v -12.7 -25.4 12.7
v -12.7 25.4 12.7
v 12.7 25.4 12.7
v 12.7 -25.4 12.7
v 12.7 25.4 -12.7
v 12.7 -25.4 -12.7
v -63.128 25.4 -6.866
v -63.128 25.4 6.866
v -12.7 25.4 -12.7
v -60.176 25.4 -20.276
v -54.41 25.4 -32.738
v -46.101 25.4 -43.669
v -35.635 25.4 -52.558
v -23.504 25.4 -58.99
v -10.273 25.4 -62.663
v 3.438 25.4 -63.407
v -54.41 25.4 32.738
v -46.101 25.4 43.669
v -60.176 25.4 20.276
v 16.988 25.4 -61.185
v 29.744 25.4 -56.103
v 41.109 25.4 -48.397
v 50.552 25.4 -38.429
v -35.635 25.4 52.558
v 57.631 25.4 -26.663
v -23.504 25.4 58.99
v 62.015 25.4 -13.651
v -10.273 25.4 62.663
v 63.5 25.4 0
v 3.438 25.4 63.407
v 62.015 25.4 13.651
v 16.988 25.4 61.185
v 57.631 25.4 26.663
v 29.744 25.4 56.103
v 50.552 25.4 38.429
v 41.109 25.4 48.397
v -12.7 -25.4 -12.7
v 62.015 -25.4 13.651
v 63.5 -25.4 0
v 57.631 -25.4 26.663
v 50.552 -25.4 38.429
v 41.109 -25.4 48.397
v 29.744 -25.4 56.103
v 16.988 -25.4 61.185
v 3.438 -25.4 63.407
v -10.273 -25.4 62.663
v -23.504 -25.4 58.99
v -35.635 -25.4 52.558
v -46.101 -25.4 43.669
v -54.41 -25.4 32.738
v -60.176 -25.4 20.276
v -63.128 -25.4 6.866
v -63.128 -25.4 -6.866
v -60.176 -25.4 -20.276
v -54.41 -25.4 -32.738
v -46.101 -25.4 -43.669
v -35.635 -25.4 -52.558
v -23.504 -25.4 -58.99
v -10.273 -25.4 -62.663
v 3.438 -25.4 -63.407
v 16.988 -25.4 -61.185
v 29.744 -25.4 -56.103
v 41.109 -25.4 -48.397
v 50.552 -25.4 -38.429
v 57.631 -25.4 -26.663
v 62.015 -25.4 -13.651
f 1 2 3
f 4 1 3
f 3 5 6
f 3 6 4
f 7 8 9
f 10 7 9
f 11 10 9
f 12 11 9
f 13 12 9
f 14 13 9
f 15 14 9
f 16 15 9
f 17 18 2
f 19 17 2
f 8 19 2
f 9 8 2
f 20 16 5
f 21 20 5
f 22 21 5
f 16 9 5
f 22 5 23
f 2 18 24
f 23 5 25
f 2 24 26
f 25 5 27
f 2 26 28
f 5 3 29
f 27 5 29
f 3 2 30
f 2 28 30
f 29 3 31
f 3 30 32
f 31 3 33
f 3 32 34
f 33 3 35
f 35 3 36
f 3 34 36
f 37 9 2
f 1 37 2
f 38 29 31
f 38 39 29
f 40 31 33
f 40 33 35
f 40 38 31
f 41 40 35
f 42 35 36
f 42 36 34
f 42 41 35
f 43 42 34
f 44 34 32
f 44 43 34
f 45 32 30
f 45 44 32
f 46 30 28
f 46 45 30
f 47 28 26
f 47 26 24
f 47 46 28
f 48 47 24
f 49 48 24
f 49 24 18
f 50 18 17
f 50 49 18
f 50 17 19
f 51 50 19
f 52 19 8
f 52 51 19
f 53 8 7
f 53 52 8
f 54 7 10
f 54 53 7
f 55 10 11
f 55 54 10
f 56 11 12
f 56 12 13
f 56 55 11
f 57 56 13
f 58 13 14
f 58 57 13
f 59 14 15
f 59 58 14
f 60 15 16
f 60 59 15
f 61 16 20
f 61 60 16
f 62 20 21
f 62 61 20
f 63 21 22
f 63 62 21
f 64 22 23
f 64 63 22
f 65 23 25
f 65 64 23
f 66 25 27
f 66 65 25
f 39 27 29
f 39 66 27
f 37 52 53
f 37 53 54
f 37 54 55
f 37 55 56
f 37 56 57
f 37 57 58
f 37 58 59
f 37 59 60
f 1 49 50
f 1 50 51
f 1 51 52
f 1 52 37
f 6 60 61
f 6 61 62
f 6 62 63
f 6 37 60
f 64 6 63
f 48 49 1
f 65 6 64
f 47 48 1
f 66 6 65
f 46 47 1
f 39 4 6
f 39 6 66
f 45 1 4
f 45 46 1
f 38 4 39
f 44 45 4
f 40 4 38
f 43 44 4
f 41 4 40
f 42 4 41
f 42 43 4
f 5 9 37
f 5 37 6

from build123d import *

# Parameters (mm, degrees)
F0_R     = 63.5
F1_DEPTH = 25.4
F2_W     = 25.4
F2_H     = 25.4
F3_DEPTH = 50.801


with BuildPart() as f1:
    # F0 (on Front) → F1 (new body, symmetric)
    with BuildSketch(Plane.XZ):
        Circle(F0_R)
    extrude(amount=F1_DEPTH, both=True)

    # F2 (on face) → F3 (cut, through all)
    with BuildSketch(Plane.XZ.offset(25.4)):
        Rectangle(F2_W, F2_H)
    extrude(amount=-F3_DEPTH, mode=Mode.SUBTRACT)


solid = f1.part
